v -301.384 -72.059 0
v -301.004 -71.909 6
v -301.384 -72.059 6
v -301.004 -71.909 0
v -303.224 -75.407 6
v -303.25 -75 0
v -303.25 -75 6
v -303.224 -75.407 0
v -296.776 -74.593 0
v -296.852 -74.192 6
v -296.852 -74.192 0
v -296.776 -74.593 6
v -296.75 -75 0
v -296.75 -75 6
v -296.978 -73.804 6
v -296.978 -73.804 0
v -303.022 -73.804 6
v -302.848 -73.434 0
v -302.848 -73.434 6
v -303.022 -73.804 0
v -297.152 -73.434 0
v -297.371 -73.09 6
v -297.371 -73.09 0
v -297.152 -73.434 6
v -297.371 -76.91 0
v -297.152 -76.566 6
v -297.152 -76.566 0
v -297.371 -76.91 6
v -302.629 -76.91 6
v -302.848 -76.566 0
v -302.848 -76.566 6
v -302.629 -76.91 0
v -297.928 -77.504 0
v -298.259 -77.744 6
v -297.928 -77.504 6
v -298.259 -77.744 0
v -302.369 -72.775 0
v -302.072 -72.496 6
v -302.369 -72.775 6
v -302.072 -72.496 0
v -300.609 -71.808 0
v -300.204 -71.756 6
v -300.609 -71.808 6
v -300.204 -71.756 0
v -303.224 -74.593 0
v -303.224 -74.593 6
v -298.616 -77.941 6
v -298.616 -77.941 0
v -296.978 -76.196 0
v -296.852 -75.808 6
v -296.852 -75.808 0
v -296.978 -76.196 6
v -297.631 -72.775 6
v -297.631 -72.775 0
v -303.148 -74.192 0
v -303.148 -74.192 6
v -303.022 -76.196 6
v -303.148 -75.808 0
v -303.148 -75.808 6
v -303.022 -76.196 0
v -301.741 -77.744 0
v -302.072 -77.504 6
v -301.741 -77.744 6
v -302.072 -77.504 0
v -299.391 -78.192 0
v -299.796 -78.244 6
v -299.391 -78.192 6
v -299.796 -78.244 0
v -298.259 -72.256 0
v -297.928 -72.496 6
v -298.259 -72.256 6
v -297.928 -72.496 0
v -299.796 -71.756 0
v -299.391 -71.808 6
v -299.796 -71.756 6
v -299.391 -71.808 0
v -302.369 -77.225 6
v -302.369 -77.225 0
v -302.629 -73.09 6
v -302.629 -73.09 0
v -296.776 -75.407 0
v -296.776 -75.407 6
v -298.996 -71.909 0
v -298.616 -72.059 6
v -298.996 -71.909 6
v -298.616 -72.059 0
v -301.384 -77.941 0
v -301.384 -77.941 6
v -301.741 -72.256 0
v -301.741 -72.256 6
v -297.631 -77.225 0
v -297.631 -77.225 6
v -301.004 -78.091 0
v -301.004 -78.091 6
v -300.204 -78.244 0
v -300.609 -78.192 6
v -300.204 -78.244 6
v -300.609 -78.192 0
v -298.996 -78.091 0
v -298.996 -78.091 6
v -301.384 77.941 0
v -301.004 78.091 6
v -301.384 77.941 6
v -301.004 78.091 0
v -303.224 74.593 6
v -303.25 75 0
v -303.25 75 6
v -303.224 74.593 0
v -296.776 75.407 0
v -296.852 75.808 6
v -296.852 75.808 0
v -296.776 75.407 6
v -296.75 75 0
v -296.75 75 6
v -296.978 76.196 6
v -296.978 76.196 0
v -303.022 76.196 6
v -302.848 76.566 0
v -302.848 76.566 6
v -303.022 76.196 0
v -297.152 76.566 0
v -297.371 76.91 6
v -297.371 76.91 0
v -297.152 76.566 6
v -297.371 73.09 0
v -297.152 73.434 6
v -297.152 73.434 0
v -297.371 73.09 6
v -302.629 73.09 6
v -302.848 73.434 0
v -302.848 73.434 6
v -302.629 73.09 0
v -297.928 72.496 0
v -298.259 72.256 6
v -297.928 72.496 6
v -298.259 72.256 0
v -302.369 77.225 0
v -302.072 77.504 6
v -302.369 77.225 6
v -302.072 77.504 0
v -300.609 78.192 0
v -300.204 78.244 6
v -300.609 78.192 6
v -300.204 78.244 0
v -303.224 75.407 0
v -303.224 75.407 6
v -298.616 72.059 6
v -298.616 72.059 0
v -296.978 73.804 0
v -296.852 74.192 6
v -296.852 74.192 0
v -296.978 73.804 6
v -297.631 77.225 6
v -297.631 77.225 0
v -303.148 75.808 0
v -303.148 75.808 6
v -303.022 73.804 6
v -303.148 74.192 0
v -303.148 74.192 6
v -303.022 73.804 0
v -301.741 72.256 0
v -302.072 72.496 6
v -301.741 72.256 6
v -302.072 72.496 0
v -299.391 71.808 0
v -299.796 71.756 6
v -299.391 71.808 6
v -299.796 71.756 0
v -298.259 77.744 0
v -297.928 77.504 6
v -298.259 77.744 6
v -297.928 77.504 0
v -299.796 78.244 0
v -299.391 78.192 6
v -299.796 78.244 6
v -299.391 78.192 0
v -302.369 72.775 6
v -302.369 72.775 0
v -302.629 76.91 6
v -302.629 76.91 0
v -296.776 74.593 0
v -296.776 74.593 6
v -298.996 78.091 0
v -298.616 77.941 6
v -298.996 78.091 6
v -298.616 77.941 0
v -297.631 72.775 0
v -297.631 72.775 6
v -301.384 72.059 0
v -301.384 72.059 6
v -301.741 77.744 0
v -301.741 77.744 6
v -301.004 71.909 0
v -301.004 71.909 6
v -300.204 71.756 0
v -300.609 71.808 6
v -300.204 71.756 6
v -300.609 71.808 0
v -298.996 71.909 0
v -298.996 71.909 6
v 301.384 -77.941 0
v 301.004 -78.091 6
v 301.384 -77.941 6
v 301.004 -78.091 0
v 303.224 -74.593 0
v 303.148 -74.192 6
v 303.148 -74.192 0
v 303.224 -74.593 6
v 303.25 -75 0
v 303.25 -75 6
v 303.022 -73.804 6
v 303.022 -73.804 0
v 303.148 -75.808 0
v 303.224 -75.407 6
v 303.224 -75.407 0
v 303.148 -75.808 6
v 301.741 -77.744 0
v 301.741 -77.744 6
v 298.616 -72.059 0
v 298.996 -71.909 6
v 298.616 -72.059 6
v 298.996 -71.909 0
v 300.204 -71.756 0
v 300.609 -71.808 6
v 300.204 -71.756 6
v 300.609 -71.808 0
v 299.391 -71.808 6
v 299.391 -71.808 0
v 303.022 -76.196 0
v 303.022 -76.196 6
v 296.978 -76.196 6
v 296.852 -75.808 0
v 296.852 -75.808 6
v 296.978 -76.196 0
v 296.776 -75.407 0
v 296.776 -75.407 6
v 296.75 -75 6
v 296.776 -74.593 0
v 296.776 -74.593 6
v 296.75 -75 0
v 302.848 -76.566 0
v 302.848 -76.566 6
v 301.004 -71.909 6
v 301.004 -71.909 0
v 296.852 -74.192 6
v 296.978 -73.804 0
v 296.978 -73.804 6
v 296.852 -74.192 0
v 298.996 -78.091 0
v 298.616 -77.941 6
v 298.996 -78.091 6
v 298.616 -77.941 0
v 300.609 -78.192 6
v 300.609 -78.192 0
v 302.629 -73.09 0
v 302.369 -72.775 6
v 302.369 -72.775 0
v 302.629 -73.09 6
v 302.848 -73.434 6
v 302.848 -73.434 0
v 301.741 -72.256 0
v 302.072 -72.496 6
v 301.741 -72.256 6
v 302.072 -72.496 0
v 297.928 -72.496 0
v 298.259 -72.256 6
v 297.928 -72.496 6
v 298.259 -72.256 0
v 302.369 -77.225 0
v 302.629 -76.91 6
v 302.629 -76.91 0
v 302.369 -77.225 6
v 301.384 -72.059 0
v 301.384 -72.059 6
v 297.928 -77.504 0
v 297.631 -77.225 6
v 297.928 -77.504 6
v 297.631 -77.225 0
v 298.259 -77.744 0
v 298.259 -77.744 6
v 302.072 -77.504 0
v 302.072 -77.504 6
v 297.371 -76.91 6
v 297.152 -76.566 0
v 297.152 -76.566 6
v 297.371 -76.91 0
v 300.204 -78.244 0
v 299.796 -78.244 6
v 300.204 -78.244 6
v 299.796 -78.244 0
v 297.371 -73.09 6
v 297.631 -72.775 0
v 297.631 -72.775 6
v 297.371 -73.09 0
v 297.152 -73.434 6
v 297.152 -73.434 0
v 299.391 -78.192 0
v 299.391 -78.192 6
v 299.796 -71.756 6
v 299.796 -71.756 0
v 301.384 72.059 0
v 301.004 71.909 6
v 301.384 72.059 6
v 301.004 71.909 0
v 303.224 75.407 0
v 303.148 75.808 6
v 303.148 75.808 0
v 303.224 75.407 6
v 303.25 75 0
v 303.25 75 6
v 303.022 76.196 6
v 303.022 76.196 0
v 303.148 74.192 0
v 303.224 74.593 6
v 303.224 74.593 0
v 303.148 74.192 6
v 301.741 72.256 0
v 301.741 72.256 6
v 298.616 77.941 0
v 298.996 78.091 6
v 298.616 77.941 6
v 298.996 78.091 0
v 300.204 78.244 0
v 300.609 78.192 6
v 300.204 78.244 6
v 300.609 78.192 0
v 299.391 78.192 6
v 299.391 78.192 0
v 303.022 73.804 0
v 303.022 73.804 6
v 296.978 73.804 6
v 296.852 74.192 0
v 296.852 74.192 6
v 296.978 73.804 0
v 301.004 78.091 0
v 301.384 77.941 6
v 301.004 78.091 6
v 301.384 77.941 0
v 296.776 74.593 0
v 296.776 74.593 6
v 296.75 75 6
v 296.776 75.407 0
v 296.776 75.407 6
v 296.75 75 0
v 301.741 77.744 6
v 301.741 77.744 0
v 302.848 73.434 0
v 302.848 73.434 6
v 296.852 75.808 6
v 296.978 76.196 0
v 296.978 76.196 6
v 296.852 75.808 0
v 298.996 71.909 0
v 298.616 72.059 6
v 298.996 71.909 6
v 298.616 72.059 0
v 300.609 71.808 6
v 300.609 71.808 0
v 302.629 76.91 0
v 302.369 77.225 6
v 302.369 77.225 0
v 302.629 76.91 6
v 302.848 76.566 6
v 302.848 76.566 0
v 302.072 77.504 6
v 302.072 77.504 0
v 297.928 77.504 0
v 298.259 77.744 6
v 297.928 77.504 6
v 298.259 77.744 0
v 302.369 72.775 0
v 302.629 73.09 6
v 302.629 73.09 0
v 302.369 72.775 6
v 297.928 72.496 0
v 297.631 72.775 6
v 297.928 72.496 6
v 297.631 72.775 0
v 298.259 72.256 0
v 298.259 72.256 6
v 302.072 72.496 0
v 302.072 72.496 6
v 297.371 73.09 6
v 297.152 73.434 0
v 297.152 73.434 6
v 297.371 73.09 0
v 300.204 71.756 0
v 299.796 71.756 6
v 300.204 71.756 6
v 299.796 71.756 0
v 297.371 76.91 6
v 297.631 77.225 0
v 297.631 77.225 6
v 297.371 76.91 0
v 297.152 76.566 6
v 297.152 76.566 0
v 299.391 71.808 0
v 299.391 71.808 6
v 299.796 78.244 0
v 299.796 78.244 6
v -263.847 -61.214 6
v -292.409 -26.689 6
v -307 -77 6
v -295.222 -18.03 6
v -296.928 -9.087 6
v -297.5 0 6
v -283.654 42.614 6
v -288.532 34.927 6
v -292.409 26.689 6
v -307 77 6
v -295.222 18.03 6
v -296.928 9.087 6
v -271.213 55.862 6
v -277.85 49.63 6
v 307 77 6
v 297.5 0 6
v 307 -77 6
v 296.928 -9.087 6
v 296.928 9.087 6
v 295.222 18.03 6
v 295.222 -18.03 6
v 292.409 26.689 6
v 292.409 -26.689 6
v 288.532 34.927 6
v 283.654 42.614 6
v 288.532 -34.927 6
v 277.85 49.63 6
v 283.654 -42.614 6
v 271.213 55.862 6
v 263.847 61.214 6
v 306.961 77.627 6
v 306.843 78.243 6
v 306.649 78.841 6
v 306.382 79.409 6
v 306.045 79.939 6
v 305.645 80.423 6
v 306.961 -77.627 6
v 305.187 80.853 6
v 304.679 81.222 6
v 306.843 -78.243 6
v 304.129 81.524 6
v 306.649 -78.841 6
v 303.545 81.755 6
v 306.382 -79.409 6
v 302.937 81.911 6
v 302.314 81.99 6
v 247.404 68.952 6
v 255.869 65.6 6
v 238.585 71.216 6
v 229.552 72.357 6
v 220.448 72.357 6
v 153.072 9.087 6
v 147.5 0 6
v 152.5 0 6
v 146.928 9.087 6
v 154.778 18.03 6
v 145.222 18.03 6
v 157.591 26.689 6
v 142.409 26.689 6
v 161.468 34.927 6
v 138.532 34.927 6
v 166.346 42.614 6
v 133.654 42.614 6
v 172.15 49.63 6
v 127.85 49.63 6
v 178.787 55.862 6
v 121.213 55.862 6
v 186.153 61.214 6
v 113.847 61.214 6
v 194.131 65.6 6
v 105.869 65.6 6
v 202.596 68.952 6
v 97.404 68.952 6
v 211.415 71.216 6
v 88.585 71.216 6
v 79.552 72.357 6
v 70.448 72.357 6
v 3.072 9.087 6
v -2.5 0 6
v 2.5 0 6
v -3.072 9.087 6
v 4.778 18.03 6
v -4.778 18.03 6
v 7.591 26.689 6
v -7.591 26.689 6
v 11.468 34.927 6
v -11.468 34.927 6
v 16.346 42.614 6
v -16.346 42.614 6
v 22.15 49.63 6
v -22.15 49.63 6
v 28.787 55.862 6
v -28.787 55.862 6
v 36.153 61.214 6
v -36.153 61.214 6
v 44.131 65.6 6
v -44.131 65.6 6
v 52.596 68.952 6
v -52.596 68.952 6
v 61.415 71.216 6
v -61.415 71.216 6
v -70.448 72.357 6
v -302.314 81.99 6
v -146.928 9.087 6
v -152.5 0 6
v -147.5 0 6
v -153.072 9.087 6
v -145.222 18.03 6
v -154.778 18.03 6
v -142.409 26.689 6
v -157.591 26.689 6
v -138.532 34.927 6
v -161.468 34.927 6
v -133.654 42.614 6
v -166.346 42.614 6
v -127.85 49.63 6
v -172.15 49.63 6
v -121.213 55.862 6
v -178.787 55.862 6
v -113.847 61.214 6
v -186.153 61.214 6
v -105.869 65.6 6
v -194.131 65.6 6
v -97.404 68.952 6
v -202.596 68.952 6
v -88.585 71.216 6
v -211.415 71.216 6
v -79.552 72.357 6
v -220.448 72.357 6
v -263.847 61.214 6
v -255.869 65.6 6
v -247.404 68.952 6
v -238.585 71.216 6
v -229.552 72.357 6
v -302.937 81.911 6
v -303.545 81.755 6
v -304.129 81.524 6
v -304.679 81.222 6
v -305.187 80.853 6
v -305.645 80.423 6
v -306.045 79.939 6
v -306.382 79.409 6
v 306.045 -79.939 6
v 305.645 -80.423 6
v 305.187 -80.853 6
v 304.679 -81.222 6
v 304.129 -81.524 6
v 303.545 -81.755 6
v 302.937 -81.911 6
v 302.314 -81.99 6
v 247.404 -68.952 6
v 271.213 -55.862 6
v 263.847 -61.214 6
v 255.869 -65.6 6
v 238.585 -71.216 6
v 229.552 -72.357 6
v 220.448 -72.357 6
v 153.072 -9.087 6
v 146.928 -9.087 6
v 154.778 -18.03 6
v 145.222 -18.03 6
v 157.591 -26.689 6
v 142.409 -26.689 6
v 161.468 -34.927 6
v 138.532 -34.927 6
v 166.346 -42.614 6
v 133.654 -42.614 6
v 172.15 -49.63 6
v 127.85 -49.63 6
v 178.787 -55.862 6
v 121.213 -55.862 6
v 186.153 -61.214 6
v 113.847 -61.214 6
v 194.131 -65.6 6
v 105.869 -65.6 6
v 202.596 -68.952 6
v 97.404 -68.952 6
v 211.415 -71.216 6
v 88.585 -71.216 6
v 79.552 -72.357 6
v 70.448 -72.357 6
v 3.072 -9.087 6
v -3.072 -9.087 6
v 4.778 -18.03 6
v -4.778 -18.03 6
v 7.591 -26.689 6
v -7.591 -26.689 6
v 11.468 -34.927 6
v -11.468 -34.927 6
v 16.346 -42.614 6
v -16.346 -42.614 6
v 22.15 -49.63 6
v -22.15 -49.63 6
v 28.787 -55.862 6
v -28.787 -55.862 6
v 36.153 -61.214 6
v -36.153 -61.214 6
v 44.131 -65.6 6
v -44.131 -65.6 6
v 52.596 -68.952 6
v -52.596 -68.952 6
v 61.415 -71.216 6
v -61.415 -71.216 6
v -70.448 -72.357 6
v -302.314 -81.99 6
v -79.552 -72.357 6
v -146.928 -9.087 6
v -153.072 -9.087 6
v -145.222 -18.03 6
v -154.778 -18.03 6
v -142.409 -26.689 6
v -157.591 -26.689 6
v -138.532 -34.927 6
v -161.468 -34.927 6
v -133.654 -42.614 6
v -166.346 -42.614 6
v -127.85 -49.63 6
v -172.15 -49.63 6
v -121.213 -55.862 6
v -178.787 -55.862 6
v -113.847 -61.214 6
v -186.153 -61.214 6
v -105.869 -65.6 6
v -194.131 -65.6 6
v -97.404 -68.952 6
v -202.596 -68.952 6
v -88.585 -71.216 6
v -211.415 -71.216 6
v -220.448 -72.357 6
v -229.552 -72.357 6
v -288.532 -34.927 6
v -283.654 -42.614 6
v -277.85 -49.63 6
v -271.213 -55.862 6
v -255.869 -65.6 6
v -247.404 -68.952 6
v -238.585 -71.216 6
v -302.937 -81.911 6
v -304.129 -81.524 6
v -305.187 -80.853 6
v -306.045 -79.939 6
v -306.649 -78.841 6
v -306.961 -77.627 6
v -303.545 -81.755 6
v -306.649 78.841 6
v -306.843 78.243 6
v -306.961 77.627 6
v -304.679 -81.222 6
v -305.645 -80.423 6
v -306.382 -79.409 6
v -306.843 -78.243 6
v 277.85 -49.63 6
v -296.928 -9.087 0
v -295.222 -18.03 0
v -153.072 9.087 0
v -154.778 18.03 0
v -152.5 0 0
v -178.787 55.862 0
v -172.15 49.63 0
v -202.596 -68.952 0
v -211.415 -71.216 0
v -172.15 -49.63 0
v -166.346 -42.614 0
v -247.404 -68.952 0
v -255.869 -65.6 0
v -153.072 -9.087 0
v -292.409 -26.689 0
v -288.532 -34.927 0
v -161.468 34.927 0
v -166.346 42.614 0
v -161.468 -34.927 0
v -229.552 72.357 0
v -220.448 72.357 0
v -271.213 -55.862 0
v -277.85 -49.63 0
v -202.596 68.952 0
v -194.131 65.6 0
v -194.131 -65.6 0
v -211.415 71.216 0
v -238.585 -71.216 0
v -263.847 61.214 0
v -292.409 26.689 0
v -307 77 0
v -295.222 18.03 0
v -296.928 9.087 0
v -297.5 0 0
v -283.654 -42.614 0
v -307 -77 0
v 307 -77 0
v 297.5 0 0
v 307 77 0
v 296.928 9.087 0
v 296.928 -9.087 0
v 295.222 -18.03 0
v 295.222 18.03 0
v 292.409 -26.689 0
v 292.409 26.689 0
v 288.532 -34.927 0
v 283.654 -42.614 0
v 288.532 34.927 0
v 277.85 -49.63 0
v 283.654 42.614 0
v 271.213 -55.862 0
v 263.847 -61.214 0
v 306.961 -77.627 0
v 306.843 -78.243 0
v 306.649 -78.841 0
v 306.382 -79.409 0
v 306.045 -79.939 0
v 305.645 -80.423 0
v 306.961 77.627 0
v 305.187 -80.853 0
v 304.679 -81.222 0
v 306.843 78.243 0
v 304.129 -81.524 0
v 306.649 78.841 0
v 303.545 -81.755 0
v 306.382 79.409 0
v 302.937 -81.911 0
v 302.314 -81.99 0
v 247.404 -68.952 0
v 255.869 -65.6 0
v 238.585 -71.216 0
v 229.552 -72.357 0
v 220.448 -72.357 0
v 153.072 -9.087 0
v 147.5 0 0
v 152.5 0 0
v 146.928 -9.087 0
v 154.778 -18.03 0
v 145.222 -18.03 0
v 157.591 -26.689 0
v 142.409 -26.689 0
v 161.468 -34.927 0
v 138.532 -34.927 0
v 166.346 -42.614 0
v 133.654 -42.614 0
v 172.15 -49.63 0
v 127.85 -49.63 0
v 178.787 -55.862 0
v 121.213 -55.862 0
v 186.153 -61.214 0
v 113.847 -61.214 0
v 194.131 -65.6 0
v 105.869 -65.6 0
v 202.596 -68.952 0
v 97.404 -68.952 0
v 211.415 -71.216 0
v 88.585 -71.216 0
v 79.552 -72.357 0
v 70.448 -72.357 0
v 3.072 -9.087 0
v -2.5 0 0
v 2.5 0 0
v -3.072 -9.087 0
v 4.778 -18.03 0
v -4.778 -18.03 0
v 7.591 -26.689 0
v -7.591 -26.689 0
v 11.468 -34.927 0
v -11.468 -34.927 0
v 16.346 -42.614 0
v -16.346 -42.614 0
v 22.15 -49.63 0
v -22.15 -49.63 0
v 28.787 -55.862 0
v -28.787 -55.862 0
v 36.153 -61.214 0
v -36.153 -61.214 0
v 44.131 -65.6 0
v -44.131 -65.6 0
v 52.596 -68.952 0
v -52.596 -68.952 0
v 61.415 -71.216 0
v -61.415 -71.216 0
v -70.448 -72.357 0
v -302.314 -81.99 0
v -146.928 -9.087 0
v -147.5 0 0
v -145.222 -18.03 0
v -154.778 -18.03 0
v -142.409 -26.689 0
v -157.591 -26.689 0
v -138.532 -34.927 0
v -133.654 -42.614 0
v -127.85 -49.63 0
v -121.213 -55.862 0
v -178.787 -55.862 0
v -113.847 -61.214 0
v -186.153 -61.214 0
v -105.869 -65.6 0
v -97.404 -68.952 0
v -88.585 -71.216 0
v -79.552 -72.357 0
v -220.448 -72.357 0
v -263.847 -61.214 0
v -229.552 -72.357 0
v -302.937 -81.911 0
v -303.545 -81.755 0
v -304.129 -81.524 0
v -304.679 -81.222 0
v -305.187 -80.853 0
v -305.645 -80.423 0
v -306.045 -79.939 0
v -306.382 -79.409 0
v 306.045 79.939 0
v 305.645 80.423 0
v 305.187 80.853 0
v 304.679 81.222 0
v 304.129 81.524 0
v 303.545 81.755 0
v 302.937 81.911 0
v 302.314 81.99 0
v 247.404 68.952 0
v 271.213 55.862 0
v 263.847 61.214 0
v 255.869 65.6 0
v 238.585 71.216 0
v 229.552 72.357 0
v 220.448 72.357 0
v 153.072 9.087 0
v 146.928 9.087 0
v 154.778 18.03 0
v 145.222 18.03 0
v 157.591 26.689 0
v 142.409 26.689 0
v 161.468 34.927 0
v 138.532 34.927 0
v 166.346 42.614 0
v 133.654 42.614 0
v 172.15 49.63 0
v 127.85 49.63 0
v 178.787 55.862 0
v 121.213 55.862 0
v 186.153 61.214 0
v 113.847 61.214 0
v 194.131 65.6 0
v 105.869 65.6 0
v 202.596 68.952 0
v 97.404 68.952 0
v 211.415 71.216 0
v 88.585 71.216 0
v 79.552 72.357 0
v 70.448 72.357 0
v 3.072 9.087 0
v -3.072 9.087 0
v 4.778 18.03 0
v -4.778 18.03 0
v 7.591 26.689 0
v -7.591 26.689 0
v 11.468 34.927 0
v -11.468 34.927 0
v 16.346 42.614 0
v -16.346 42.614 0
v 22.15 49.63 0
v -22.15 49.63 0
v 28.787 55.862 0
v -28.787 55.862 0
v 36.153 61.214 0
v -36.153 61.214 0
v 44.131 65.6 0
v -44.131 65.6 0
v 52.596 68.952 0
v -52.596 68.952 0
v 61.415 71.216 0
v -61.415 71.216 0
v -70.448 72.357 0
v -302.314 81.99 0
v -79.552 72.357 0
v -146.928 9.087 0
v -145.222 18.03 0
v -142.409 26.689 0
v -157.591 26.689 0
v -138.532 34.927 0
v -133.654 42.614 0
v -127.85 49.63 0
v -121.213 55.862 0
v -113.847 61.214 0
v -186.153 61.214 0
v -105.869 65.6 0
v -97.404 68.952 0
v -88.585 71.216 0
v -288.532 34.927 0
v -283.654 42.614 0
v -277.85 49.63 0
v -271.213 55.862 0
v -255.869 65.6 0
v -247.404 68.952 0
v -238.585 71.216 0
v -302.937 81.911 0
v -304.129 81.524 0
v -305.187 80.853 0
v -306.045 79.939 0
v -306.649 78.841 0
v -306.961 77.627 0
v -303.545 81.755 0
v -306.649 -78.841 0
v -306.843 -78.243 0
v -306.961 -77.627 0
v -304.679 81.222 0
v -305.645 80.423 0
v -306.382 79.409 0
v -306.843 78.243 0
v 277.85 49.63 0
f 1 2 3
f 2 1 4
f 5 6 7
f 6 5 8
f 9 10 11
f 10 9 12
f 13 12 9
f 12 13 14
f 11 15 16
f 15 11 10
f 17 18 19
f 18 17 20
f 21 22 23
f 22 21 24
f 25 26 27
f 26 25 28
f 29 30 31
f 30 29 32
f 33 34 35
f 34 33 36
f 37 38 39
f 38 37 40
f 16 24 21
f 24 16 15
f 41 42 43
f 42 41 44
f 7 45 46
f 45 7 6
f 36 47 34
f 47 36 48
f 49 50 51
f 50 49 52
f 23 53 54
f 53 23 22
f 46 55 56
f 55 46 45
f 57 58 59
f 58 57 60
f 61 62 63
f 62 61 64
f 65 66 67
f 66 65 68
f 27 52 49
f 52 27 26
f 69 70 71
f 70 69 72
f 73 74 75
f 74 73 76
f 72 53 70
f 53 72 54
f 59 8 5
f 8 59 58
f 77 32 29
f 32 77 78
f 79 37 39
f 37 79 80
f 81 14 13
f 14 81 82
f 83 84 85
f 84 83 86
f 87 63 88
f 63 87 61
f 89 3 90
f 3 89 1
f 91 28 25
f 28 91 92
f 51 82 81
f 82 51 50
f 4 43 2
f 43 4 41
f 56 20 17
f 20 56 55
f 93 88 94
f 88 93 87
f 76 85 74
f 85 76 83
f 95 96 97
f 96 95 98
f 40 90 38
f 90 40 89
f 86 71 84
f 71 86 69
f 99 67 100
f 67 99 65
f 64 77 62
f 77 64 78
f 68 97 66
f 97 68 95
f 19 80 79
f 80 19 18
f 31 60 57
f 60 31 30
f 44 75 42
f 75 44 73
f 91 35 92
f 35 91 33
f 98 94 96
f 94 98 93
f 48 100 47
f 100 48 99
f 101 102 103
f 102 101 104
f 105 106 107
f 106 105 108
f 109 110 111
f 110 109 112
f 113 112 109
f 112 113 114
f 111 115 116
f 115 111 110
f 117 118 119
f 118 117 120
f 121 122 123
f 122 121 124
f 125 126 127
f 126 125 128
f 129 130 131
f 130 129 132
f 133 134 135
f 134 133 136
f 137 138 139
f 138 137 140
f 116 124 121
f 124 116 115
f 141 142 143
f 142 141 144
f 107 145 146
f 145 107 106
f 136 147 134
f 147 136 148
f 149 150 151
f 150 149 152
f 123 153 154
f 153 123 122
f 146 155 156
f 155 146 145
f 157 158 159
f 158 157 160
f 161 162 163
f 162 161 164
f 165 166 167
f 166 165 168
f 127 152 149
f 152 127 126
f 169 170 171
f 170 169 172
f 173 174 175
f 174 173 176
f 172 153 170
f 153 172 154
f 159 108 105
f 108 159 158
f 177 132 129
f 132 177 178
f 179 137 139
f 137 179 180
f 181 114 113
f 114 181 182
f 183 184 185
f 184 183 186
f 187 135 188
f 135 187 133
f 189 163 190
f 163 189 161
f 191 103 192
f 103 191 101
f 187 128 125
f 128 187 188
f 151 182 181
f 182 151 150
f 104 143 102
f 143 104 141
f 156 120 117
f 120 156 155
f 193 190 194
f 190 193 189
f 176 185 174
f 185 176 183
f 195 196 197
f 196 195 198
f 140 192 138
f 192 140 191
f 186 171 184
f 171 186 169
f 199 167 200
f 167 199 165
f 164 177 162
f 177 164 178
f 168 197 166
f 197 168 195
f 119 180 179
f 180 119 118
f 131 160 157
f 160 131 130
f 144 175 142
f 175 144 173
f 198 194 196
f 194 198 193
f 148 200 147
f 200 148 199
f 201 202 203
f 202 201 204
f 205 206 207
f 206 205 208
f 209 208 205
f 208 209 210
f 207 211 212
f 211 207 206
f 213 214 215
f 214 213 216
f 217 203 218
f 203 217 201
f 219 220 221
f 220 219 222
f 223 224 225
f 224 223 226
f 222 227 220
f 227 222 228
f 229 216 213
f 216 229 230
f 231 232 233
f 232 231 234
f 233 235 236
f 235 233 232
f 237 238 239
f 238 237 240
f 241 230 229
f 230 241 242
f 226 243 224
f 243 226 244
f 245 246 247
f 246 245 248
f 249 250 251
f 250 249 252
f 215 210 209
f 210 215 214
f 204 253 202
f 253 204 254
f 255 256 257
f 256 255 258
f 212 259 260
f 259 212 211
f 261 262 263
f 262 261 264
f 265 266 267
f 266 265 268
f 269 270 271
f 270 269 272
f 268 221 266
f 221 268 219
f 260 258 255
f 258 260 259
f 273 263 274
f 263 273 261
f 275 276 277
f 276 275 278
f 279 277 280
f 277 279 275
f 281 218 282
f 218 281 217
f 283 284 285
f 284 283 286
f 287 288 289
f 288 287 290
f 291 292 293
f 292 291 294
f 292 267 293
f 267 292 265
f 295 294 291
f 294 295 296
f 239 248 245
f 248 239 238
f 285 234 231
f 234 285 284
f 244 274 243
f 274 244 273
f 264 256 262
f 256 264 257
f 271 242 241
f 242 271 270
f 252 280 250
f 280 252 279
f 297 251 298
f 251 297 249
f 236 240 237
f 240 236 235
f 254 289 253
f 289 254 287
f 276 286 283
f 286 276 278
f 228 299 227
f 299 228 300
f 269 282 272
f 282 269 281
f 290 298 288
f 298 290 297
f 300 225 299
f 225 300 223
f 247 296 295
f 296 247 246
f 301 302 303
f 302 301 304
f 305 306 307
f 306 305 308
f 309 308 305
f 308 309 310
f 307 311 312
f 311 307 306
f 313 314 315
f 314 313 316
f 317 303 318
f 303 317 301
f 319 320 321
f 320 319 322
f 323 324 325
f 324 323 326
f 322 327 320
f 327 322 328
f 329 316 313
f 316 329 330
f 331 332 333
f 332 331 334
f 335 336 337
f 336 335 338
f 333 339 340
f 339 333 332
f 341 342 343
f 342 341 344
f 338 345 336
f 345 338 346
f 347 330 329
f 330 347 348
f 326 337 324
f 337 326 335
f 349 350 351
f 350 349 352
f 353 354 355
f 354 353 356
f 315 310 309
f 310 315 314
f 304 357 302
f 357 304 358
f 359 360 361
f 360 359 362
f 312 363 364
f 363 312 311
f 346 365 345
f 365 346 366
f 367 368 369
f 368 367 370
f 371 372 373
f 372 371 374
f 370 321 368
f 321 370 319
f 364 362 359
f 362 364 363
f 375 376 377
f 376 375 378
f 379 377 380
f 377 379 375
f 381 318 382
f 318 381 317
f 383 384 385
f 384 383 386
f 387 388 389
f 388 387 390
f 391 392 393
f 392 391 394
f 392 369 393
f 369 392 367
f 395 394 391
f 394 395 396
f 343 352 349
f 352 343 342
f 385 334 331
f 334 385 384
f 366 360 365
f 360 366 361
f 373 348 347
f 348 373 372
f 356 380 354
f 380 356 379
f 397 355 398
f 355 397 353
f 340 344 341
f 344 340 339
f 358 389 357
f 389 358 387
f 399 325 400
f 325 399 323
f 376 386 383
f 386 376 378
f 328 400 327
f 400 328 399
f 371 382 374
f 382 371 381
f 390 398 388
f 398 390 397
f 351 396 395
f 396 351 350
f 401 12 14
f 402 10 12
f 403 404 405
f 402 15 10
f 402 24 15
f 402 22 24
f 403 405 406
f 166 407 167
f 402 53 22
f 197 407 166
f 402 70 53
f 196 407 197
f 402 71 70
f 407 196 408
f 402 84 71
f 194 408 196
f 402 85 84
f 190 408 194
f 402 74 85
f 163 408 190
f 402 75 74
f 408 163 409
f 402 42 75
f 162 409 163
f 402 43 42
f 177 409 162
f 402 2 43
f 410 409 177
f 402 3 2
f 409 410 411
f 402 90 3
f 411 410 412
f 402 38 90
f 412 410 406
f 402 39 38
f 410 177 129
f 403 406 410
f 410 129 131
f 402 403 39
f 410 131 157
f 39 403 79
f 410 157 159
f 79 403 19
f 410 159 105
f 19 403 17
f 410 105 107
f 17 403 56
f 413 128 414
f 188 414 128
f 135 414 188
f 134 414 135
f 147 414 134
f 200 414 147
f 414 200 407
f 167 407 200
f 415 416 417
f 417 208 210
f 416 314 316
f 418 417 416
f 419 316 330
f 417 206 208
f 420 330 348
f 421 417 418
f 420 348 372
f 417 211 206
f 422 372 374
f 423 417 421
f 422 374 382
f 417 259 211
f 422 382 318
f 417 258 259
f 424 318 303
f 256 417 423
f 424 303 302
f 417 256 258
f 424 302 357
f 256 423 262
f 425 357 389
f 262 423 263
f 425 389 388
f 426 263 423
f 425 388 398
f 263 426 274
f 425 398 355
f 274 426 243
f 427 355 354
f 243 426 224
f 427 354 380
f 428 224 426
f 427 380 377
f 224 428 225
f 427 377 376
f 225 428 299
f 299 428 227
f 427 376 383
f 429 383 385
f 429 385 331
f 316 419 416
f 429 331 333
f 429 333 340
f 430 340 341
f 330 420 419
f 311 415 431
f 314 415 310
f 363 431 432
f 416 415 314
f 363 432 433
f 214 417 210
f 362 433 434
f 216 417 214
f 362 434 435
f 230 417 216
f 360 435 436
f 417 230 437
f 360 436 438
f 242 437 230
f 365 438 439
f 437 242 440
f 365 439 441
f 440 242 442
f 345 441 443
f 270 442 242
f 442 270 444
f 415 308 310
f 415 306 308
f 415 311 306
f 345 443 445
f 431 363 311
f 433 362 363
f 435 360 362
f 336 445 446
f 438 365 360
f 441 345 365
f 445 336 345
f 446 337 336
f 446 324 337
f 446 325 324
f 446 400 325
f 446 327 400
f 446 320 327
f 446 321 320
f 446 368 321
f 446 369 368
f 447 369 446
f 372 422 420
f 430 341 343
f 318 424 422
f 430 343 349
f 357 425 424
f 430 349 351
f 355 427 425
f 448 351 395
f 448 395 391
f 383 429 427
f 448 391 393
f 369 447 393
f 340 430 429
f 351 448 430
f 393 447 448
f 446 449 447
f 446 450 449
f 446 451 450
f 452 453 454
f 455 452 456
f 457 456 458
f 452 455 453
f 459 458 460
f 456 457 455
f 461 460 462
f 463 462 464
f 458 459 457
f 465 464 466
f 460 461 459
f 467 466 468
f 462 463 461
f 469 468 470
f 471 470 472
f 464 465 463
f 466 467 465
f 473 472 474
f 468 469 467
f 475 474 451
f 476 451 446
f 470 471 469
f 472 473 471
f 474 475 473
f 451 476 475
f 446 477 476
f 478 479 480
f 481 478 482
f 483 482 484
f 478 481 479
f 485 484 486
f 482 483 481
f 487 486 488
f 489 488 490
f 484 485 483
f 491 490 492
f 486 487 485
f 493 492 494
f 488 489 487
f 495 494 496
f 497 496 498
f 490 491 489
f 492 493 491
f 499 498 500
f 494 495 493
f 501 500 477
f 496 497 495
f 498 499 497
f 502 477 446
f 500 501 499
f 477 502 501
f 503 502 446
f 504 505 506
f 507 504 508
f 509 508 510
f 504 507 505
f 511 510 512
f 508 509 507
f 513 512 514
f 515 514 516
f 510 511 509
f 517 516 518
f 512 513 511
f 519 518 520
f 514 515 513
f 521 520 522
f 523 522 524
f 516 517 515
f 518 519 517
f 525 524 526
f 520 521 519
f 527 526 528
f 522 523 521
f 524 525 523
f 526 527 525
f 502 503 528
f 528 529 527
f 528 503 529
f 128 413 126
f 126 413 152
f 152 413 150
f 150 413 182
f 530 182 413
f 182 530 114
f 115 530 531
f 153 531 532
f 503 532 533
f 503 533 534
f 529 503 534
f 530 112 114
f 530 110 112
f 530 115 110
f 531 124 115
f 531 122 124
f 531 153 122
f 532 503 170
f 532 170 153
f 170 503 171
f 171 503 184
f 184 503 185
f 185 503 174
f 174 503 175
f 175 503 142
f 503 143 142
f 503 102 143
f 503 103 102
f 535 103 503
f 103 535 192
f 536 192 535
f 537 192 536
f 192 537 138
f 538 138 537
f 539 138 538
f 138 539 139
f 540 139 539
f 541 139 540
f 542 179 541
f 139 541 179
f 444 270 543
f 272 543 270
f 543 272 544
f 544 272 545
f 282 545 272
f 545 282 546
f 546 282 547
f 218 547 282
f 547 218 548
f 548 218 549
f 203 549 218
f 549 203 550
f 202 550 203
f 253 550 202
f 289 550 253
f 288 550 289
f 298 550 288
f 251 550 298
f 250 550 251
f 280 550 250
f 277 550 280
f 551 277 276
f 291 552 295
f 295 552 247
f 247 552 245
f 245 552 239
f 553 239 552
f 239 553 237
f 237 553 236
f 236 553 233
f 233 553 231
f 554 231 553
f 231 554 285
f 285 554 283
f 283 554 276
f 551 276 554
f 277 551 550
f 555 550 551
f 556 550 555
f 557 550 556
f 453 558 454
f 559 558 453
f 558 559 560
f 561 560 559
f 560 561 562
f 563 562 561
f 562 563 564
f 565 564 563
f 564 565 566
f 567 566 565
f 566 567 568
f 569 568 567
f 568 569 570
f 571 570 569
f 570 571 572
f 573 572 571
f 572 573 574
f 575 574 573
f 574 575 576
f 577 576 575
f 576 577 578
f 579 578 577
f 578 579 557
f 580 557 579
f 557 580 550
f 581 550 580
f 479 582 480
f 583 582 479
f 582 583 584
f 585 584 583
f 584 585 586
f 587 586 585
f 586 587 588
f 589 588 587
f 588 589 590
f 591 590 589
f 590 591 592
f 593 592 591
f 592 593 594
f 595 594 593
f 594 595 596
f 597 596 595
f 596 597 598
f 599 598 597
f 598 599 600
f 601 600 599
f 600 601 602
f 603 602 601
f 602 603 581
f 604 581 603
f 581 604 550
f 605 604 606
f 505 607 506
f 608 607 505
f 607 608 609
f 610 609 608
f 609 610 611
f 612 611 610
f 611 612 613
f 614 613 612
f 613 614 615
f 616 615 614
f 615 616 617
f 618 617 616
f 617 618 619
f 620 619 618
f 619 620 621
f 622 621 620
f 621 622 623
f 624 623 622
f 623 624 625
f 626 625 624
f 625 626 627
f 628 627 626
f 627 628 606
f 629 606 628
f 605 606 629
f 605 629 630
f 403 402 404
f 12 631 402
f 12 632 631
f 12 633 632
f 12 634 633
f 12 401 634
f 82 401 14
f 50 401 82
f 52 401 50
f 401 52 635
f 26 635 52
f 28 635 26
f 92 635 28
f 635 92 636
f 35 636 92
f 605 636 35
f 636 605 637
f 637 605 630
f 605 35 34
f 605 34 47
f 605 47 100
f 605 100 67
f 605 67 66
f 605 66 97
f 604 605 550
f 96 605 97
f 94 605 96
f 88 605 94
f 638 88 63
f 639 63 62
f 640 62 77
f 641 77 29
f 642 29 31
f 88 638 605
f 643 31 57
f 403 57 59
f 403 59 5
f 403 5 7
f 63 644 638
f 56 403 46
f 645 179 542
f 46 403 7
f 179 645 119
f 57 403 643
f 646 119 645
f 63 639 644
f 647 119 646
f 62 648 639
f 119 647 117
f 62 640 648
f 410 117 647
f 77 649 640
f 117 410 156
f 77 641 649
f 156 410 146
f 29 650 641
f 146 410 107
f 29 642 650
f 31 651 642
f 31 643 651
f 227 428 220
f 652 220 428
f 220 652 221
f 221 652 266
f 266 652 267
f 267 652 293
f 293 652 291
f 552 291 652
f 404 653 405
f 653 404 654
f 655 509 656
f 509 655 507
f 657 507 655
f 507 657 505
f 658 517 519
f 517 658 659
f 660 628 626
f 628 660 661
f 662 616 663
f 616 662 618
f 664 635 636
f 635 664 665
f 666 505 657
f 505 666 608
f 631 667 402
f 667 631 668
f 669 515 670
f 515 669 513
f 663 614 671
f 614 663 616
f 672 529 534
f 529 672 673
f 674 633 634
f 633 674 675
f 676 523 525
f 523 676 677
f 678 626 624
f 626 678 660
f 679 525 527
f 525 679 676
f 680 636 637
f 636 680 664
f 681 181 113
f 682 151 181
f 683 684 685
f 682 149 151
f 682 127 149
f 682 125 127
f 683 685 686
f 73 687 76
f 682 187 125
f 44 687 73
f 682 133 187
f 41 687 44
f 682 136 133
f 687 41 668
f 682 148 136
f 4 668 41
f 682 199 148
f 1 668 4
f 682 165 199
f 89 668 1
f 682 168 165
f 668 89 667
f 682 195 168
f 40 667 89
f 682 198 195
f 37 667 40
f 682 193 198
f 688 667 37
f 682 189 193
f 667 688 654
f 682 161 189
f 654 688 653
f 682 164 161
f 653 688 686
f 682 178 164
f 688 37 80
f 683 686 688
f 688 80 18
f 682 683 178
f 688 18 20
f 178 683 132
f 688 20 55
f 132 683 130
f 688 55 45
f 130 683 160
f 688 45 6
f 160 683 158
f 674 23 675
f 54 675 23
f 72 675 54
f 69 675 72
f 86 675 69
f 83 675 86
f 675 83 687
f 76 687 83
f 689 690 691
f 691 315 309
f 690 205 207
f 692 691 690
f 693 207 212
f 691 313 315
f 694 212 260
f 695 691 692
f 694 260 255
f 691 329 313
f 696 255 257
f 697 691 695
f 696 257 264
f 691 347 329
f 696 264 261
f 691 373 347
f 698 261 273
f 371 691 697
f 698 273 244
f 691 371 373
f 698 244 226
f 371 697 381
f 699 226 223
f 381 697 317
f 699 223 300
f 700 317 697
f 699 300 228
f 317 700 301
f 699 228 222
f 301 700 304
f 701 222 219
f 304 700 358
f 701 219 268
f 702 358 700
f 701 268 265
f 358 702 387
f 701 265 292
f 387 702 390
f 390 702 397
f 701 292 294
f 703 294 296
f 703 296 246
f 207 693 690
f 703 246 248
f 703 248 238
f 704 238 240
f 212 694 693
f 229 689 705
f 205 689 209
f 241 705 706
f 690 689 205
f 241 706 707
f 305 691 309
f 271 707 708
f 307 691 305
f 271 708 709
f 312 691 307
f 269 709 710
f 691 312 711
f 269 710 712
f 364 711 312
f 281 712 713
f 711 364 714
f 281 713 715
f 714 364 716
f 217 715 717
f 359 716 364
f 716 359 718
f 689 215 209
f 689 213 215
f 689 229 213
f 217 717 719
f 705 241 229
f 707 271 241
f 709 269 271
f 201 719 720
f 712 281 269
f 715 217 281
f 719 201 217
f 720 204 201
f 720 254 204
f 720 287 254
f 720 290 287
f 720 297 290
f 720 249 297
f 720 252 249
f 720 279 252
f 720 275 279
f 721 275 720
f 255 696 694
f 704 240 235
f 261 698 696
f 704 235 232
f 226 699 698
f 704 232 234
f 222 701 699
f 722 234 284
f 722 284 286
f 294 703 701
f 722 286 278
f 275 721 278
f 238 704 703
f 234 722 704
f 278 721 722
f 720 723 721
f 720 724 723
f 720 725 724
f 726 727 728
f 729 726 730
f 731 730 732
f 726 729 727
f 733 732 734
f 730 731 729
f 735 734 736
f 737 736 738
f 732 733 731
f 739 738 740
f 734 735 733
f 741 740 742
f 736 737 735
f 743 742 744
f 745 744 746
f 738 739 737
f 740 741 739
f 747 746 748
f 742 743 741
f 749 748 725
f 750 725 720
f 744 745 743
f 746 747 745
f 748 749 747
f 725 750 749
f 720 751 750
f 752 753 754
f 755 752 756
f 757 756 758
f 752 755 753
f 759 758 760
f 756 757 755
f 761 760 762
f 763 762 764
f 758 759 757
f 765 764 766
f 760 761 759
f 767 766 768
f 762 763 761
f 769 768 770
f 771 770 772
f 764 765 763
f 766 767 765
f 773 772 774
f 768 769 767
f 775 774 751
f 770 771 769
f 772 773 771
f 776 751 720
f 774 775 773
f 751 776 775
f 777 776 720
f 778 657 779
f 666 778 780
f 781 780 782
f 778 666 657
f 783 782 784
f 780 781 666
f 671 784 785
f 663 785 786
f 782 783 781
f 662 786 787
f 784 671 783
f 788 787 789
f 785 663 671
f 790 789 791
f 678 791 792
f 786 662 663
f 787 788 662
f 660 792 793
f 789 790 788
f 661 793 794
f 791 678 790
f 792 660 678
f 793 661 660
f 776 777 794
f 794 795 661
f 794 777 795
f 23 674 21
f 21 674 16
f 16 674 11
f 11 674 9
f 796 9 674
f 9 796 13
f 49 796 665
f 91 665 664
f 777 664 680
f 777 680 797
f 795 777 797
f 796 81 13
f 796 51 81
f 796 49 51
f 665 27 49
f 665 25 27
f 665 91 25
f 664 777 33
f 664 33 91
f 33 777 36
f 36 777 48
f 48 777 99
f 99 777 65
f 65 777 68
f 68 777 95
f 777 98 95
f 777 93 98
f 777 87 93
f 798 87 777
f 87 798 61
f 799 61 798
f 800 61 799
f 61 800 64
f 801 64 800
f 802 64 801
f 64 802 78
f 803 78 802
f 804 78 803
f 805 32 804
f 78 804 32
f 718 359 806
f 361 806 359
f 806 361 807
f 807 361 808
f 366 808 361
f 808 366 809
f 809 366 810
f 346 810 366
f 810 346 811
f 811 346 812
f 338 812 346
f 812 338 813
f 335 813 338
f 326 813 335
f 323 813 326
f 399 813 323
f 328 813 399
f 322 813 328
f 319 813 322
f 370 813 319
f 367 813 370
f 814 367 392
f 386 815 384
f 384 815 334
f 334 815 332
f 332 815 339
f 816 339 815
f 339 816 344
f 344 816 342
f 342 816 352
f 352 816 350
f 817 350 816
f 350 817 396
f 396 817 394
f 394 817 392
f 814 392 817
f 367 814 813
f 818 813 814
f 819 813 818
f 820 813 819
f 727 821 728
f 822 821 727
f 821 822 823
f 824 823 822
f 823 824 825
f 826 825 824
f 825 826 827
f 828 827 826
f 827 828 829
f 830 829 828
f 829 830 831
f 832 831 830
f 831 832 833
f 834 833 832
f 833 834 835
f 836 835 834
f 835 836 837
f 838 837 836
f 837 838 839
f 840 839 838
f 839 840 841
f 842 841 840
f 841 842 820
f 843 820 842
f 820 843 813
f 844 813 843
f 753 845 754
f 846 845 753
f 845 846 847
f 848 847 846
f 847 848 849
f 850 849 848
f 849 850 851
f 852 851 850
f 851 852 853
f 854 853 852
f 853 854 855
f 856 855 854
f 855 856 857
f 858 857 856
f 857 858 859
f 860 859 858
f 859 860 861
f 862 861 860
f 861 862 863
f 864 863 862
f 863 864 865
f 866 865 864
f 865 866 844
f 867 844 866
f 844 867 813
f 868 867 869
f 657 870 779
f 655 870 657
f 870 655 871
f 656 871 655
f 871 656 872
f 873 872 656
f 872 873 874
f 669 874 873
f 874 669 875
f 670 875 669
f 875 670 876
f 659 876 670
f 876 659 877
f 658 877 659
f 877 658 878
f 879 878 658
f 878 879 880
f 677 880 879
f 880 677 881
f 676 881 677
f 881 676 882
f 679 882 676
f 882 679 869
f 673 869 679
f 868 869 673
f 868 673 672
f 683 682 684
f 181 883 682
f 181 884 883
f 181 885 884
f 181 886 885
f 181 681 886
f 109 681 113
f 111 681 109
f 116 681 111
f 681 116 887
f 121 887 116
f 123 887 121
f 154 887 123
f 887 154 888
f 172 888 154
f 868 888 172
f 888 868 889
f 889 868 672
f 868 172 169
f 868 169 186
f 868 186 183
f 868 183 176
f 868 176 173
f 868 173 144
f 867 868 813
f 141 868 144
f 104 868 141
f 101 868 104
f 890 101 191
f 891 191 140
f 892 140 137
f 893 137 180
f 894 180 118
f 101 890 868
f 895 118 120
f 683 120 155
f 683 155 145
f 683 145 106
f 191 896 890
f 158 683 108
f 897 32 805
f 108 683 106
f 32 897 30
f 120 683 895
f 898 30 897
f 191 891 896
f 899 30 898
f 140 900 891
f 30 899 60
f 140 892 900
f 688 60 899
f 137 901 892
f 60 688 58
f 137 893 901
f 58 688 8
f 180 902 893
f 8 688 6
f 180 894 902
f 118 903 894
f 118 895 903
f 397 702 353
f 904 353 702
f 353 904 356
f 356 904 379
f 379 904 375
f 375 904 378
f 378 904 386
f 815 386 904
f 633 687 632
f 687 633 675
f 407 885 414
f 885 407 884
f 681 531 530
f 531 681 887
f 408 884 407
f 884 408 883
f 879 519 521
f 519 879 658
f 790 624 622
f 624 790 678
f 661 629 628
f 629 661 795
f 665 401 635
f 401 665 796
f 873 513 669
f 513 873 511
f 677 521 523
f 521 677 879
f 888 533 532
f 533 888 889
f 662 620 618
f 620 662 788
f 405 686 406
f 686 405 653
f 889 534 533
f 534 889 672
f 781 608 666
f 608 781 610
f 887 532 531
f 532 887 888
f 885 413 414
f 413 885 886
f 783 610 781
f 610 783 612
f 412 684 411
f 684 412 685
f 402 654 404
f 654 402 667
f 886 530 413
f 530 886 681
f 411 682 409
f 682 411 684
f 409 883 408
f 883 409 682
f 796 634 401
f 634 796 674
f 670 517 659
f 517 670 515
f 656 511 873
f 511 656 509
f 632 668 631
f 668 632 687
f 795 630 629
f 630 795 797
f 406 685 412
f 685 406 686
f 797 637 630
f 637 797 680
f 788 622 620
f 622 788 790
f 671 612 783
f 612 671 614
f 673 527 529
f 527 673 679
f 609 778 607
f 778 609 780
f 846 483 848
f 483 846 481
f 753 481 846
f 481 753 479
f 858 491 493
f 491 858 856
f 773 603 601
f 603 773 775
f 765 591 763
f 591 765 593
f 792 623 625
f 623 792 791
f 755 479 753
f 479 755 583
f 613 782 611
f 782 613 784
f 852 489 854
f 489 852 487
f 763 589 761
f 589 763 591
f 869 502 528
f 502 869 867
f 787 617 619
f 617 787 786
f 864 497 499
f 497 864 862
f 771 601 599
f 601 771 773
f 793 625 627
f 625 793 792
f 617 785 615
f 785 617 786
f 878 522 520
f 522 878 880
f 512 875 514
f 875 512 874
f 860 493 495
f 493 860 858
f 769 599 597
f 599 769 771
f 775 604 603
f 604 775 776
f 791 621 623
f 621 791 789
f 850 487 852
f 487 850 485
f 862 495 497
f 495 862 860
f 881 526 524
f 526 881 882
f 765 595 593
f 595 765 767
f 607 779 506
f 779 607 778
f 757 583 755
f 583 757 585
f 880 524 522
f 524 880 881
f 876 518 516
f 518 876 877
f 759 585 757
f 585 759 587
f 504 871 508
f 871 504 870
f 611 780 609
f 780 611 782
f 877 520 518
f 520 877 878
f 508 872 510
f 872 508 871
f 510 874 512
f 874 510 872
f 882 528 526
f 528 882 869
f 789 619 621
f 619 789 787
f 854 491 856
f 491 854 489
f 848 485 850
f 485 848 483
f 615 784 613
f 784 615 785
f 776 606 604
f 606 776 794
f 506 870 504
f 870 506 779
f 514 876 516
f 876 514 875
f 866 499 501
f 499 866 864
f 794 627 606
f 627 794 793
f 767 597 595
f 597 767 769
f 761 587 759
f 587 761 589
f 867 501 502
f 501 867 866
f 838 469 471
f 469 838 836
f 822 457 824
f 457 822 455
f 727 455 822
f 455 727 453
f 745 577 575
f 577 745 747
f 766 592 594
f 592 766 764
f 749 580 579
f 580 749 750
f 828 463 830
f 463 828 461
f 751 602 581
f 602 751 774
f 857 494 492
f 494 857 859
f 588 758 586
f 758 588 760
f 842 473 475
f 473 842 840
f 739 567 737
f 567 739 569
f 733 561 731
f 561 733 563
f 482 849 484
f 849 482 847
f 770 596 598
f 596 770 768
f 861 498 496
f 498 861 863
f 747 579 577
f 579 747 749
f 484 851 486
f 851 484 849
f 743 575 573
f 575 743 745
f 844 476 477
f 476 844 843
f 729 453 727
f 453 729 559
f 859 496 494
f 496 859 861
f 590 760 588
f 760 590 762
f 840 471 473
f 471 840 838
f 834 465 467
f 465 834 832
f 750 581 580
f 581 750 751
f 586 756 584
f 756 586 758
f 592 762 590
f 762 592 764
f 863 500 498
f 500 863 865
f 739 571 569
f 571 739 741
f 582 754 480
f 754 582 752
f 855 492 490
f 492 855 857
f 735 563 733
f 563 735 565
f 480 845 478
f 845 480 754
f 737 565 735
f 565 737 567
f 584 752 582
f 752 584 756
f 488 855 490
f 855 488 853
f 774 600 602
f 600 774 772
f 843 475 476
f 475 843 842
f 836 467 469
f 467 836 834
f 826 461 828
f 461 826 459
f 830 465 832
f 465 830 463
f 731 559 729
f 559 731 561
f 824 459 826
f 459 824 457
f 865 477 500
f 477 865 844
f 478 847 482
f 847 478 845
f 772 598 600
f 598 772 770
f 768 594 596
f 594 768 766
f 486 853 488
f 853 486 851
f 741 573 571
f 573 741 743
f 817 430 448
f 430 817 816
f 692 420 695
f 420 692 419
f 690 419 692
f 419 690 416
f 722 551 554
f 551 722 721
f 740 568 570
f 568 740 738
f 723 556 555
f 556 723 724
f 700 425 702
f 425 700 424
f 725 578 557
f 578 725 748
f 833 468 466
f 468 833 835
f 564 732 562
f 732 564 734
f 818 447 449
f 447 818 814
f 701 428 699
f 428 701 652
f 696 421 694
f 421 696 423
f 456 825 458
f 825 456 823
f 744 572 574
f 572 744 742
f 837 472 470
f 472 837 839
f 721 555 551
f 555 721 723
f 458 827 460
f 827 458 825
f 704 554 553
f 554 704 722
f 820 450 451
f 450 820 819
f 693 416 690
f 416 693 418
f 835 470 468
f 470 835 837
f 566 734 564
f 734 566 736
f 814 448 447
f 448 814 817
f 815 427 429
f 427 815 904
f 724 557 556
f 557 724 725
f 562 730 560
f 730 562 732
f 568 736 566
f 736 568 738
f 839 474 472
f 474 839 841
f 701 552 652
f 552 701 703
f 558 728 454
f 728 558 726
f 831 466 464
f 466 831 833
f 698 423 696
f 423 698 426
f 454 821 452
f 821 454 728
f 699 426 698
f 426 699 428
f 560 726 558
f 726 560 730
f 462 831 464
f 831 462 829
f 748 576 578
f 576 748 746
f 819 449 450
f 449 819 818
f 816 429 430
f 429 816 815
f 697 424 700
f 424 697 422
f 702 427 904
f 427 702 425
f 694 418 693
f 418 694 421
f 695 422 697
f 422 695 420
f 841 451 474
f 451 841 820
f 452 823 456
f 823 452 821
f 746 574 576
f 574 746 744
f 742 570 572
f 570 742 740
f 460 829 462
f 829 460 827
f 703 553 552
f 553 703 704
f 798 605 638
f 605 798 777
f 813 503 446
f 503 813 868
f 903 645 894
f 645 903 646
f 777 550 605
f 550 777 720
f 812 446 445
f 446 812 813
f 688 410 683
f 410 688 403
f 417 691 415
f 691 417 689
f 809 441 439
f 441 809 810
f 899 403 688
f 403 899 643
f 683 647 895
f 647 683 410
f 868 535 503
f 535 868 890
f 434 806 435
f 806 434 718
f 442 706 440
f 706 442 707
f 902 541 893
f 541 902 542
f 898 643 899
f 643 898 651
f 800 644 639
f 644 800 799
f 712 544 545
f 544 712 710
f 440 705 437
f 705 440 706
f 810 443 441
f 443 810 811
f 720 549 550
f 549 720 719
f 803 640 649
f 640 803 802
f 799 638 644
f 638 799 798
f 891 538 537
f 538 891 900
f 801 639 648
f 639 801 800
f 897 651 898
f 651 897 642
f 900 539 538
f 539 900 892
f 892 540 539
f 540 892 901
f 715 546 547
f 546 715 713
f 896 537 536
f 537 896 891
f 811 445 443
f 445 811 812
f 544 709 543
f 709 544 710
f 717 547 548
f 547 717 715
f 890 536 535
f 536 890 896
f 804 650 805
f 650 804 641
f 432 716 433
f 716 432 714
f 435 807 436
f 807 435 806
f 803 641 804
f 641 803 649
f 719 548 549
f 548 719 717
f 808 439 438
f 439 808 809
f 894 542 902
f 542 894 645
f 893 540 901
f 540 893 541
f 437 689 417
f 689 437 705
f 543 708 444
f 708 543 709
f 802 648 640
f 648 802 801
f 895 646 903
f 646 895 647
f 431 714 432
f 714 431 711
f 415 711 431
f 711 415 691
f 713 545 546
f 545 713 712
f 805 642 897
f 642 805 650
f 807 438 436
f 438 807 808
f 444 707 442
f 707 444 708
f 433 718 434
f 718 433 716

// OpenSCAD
$fn = 50;

difference() {
	union() {
		hull() {
			translate(v = [-302.0, 77.0, 0]) {
				cylinder(h = 6, r = 5);
			}
			translate(v = [302.0, 77.0, 0]) {
				cylinder(h = 6, r = 5);
			}
			translate(v = [-302.0, -77.0, 0]) {
				cylinder(h = 6, r = 5);
			}
			translate(v = [302.0, -77.0, 0]) {
				cylinder(h = 6, r = 5);
			}
		}
	}
	union() {
		translate(v = [-300.0, -75.0, -100.0]) {
			cylinder(h = 200, r = 3.25);
		}
		translate(v = [-300.0, 75.0, -100.0]) {
			cylinder(h = 200, r = 3.25);
		}
		translate(v = [300.0, -75.0, -100.0]) {
			cylinder(h = 200, r = 3.25);
		}
		translate(v = [300.0, 75.0, -100.0]) {
			cylinder(h = 200, r = 3.25);
		}
		translate(v = [-300.0, -75.0, -100.0]) {
			cylinder(h = 200, r = 1.8);
		}
		translate(v = [-300.0, 75.0, -100.0]) {
			cylinder(h = 200, r = 1.8);
		}
		translate(v = [300.0, -75.0, -100.0]) {
			cylinder(h = 200, r = 1.8);
		}
		translate(v = [300.0, 75.0, -100.0]) {
			cylinder(h = 200, r = 1.8);
		}
		translate(v = [-225.0, 0, 0.0]) {
			cylinder(h = 6, r = 72.5);
		}
		translate(v = [-75.0, 0, 0.0]) {
			cylinder(h = 6, r = 72.5);
		}
		translate(v = [75.0, 0, 0.0]) {
			cylinder(h = 6, r = 72.5);
		}
		translate(v = [225.0, 0, 0.0]) {
			cylinder(h = 6, r = 72.5);
		}
	}
}
